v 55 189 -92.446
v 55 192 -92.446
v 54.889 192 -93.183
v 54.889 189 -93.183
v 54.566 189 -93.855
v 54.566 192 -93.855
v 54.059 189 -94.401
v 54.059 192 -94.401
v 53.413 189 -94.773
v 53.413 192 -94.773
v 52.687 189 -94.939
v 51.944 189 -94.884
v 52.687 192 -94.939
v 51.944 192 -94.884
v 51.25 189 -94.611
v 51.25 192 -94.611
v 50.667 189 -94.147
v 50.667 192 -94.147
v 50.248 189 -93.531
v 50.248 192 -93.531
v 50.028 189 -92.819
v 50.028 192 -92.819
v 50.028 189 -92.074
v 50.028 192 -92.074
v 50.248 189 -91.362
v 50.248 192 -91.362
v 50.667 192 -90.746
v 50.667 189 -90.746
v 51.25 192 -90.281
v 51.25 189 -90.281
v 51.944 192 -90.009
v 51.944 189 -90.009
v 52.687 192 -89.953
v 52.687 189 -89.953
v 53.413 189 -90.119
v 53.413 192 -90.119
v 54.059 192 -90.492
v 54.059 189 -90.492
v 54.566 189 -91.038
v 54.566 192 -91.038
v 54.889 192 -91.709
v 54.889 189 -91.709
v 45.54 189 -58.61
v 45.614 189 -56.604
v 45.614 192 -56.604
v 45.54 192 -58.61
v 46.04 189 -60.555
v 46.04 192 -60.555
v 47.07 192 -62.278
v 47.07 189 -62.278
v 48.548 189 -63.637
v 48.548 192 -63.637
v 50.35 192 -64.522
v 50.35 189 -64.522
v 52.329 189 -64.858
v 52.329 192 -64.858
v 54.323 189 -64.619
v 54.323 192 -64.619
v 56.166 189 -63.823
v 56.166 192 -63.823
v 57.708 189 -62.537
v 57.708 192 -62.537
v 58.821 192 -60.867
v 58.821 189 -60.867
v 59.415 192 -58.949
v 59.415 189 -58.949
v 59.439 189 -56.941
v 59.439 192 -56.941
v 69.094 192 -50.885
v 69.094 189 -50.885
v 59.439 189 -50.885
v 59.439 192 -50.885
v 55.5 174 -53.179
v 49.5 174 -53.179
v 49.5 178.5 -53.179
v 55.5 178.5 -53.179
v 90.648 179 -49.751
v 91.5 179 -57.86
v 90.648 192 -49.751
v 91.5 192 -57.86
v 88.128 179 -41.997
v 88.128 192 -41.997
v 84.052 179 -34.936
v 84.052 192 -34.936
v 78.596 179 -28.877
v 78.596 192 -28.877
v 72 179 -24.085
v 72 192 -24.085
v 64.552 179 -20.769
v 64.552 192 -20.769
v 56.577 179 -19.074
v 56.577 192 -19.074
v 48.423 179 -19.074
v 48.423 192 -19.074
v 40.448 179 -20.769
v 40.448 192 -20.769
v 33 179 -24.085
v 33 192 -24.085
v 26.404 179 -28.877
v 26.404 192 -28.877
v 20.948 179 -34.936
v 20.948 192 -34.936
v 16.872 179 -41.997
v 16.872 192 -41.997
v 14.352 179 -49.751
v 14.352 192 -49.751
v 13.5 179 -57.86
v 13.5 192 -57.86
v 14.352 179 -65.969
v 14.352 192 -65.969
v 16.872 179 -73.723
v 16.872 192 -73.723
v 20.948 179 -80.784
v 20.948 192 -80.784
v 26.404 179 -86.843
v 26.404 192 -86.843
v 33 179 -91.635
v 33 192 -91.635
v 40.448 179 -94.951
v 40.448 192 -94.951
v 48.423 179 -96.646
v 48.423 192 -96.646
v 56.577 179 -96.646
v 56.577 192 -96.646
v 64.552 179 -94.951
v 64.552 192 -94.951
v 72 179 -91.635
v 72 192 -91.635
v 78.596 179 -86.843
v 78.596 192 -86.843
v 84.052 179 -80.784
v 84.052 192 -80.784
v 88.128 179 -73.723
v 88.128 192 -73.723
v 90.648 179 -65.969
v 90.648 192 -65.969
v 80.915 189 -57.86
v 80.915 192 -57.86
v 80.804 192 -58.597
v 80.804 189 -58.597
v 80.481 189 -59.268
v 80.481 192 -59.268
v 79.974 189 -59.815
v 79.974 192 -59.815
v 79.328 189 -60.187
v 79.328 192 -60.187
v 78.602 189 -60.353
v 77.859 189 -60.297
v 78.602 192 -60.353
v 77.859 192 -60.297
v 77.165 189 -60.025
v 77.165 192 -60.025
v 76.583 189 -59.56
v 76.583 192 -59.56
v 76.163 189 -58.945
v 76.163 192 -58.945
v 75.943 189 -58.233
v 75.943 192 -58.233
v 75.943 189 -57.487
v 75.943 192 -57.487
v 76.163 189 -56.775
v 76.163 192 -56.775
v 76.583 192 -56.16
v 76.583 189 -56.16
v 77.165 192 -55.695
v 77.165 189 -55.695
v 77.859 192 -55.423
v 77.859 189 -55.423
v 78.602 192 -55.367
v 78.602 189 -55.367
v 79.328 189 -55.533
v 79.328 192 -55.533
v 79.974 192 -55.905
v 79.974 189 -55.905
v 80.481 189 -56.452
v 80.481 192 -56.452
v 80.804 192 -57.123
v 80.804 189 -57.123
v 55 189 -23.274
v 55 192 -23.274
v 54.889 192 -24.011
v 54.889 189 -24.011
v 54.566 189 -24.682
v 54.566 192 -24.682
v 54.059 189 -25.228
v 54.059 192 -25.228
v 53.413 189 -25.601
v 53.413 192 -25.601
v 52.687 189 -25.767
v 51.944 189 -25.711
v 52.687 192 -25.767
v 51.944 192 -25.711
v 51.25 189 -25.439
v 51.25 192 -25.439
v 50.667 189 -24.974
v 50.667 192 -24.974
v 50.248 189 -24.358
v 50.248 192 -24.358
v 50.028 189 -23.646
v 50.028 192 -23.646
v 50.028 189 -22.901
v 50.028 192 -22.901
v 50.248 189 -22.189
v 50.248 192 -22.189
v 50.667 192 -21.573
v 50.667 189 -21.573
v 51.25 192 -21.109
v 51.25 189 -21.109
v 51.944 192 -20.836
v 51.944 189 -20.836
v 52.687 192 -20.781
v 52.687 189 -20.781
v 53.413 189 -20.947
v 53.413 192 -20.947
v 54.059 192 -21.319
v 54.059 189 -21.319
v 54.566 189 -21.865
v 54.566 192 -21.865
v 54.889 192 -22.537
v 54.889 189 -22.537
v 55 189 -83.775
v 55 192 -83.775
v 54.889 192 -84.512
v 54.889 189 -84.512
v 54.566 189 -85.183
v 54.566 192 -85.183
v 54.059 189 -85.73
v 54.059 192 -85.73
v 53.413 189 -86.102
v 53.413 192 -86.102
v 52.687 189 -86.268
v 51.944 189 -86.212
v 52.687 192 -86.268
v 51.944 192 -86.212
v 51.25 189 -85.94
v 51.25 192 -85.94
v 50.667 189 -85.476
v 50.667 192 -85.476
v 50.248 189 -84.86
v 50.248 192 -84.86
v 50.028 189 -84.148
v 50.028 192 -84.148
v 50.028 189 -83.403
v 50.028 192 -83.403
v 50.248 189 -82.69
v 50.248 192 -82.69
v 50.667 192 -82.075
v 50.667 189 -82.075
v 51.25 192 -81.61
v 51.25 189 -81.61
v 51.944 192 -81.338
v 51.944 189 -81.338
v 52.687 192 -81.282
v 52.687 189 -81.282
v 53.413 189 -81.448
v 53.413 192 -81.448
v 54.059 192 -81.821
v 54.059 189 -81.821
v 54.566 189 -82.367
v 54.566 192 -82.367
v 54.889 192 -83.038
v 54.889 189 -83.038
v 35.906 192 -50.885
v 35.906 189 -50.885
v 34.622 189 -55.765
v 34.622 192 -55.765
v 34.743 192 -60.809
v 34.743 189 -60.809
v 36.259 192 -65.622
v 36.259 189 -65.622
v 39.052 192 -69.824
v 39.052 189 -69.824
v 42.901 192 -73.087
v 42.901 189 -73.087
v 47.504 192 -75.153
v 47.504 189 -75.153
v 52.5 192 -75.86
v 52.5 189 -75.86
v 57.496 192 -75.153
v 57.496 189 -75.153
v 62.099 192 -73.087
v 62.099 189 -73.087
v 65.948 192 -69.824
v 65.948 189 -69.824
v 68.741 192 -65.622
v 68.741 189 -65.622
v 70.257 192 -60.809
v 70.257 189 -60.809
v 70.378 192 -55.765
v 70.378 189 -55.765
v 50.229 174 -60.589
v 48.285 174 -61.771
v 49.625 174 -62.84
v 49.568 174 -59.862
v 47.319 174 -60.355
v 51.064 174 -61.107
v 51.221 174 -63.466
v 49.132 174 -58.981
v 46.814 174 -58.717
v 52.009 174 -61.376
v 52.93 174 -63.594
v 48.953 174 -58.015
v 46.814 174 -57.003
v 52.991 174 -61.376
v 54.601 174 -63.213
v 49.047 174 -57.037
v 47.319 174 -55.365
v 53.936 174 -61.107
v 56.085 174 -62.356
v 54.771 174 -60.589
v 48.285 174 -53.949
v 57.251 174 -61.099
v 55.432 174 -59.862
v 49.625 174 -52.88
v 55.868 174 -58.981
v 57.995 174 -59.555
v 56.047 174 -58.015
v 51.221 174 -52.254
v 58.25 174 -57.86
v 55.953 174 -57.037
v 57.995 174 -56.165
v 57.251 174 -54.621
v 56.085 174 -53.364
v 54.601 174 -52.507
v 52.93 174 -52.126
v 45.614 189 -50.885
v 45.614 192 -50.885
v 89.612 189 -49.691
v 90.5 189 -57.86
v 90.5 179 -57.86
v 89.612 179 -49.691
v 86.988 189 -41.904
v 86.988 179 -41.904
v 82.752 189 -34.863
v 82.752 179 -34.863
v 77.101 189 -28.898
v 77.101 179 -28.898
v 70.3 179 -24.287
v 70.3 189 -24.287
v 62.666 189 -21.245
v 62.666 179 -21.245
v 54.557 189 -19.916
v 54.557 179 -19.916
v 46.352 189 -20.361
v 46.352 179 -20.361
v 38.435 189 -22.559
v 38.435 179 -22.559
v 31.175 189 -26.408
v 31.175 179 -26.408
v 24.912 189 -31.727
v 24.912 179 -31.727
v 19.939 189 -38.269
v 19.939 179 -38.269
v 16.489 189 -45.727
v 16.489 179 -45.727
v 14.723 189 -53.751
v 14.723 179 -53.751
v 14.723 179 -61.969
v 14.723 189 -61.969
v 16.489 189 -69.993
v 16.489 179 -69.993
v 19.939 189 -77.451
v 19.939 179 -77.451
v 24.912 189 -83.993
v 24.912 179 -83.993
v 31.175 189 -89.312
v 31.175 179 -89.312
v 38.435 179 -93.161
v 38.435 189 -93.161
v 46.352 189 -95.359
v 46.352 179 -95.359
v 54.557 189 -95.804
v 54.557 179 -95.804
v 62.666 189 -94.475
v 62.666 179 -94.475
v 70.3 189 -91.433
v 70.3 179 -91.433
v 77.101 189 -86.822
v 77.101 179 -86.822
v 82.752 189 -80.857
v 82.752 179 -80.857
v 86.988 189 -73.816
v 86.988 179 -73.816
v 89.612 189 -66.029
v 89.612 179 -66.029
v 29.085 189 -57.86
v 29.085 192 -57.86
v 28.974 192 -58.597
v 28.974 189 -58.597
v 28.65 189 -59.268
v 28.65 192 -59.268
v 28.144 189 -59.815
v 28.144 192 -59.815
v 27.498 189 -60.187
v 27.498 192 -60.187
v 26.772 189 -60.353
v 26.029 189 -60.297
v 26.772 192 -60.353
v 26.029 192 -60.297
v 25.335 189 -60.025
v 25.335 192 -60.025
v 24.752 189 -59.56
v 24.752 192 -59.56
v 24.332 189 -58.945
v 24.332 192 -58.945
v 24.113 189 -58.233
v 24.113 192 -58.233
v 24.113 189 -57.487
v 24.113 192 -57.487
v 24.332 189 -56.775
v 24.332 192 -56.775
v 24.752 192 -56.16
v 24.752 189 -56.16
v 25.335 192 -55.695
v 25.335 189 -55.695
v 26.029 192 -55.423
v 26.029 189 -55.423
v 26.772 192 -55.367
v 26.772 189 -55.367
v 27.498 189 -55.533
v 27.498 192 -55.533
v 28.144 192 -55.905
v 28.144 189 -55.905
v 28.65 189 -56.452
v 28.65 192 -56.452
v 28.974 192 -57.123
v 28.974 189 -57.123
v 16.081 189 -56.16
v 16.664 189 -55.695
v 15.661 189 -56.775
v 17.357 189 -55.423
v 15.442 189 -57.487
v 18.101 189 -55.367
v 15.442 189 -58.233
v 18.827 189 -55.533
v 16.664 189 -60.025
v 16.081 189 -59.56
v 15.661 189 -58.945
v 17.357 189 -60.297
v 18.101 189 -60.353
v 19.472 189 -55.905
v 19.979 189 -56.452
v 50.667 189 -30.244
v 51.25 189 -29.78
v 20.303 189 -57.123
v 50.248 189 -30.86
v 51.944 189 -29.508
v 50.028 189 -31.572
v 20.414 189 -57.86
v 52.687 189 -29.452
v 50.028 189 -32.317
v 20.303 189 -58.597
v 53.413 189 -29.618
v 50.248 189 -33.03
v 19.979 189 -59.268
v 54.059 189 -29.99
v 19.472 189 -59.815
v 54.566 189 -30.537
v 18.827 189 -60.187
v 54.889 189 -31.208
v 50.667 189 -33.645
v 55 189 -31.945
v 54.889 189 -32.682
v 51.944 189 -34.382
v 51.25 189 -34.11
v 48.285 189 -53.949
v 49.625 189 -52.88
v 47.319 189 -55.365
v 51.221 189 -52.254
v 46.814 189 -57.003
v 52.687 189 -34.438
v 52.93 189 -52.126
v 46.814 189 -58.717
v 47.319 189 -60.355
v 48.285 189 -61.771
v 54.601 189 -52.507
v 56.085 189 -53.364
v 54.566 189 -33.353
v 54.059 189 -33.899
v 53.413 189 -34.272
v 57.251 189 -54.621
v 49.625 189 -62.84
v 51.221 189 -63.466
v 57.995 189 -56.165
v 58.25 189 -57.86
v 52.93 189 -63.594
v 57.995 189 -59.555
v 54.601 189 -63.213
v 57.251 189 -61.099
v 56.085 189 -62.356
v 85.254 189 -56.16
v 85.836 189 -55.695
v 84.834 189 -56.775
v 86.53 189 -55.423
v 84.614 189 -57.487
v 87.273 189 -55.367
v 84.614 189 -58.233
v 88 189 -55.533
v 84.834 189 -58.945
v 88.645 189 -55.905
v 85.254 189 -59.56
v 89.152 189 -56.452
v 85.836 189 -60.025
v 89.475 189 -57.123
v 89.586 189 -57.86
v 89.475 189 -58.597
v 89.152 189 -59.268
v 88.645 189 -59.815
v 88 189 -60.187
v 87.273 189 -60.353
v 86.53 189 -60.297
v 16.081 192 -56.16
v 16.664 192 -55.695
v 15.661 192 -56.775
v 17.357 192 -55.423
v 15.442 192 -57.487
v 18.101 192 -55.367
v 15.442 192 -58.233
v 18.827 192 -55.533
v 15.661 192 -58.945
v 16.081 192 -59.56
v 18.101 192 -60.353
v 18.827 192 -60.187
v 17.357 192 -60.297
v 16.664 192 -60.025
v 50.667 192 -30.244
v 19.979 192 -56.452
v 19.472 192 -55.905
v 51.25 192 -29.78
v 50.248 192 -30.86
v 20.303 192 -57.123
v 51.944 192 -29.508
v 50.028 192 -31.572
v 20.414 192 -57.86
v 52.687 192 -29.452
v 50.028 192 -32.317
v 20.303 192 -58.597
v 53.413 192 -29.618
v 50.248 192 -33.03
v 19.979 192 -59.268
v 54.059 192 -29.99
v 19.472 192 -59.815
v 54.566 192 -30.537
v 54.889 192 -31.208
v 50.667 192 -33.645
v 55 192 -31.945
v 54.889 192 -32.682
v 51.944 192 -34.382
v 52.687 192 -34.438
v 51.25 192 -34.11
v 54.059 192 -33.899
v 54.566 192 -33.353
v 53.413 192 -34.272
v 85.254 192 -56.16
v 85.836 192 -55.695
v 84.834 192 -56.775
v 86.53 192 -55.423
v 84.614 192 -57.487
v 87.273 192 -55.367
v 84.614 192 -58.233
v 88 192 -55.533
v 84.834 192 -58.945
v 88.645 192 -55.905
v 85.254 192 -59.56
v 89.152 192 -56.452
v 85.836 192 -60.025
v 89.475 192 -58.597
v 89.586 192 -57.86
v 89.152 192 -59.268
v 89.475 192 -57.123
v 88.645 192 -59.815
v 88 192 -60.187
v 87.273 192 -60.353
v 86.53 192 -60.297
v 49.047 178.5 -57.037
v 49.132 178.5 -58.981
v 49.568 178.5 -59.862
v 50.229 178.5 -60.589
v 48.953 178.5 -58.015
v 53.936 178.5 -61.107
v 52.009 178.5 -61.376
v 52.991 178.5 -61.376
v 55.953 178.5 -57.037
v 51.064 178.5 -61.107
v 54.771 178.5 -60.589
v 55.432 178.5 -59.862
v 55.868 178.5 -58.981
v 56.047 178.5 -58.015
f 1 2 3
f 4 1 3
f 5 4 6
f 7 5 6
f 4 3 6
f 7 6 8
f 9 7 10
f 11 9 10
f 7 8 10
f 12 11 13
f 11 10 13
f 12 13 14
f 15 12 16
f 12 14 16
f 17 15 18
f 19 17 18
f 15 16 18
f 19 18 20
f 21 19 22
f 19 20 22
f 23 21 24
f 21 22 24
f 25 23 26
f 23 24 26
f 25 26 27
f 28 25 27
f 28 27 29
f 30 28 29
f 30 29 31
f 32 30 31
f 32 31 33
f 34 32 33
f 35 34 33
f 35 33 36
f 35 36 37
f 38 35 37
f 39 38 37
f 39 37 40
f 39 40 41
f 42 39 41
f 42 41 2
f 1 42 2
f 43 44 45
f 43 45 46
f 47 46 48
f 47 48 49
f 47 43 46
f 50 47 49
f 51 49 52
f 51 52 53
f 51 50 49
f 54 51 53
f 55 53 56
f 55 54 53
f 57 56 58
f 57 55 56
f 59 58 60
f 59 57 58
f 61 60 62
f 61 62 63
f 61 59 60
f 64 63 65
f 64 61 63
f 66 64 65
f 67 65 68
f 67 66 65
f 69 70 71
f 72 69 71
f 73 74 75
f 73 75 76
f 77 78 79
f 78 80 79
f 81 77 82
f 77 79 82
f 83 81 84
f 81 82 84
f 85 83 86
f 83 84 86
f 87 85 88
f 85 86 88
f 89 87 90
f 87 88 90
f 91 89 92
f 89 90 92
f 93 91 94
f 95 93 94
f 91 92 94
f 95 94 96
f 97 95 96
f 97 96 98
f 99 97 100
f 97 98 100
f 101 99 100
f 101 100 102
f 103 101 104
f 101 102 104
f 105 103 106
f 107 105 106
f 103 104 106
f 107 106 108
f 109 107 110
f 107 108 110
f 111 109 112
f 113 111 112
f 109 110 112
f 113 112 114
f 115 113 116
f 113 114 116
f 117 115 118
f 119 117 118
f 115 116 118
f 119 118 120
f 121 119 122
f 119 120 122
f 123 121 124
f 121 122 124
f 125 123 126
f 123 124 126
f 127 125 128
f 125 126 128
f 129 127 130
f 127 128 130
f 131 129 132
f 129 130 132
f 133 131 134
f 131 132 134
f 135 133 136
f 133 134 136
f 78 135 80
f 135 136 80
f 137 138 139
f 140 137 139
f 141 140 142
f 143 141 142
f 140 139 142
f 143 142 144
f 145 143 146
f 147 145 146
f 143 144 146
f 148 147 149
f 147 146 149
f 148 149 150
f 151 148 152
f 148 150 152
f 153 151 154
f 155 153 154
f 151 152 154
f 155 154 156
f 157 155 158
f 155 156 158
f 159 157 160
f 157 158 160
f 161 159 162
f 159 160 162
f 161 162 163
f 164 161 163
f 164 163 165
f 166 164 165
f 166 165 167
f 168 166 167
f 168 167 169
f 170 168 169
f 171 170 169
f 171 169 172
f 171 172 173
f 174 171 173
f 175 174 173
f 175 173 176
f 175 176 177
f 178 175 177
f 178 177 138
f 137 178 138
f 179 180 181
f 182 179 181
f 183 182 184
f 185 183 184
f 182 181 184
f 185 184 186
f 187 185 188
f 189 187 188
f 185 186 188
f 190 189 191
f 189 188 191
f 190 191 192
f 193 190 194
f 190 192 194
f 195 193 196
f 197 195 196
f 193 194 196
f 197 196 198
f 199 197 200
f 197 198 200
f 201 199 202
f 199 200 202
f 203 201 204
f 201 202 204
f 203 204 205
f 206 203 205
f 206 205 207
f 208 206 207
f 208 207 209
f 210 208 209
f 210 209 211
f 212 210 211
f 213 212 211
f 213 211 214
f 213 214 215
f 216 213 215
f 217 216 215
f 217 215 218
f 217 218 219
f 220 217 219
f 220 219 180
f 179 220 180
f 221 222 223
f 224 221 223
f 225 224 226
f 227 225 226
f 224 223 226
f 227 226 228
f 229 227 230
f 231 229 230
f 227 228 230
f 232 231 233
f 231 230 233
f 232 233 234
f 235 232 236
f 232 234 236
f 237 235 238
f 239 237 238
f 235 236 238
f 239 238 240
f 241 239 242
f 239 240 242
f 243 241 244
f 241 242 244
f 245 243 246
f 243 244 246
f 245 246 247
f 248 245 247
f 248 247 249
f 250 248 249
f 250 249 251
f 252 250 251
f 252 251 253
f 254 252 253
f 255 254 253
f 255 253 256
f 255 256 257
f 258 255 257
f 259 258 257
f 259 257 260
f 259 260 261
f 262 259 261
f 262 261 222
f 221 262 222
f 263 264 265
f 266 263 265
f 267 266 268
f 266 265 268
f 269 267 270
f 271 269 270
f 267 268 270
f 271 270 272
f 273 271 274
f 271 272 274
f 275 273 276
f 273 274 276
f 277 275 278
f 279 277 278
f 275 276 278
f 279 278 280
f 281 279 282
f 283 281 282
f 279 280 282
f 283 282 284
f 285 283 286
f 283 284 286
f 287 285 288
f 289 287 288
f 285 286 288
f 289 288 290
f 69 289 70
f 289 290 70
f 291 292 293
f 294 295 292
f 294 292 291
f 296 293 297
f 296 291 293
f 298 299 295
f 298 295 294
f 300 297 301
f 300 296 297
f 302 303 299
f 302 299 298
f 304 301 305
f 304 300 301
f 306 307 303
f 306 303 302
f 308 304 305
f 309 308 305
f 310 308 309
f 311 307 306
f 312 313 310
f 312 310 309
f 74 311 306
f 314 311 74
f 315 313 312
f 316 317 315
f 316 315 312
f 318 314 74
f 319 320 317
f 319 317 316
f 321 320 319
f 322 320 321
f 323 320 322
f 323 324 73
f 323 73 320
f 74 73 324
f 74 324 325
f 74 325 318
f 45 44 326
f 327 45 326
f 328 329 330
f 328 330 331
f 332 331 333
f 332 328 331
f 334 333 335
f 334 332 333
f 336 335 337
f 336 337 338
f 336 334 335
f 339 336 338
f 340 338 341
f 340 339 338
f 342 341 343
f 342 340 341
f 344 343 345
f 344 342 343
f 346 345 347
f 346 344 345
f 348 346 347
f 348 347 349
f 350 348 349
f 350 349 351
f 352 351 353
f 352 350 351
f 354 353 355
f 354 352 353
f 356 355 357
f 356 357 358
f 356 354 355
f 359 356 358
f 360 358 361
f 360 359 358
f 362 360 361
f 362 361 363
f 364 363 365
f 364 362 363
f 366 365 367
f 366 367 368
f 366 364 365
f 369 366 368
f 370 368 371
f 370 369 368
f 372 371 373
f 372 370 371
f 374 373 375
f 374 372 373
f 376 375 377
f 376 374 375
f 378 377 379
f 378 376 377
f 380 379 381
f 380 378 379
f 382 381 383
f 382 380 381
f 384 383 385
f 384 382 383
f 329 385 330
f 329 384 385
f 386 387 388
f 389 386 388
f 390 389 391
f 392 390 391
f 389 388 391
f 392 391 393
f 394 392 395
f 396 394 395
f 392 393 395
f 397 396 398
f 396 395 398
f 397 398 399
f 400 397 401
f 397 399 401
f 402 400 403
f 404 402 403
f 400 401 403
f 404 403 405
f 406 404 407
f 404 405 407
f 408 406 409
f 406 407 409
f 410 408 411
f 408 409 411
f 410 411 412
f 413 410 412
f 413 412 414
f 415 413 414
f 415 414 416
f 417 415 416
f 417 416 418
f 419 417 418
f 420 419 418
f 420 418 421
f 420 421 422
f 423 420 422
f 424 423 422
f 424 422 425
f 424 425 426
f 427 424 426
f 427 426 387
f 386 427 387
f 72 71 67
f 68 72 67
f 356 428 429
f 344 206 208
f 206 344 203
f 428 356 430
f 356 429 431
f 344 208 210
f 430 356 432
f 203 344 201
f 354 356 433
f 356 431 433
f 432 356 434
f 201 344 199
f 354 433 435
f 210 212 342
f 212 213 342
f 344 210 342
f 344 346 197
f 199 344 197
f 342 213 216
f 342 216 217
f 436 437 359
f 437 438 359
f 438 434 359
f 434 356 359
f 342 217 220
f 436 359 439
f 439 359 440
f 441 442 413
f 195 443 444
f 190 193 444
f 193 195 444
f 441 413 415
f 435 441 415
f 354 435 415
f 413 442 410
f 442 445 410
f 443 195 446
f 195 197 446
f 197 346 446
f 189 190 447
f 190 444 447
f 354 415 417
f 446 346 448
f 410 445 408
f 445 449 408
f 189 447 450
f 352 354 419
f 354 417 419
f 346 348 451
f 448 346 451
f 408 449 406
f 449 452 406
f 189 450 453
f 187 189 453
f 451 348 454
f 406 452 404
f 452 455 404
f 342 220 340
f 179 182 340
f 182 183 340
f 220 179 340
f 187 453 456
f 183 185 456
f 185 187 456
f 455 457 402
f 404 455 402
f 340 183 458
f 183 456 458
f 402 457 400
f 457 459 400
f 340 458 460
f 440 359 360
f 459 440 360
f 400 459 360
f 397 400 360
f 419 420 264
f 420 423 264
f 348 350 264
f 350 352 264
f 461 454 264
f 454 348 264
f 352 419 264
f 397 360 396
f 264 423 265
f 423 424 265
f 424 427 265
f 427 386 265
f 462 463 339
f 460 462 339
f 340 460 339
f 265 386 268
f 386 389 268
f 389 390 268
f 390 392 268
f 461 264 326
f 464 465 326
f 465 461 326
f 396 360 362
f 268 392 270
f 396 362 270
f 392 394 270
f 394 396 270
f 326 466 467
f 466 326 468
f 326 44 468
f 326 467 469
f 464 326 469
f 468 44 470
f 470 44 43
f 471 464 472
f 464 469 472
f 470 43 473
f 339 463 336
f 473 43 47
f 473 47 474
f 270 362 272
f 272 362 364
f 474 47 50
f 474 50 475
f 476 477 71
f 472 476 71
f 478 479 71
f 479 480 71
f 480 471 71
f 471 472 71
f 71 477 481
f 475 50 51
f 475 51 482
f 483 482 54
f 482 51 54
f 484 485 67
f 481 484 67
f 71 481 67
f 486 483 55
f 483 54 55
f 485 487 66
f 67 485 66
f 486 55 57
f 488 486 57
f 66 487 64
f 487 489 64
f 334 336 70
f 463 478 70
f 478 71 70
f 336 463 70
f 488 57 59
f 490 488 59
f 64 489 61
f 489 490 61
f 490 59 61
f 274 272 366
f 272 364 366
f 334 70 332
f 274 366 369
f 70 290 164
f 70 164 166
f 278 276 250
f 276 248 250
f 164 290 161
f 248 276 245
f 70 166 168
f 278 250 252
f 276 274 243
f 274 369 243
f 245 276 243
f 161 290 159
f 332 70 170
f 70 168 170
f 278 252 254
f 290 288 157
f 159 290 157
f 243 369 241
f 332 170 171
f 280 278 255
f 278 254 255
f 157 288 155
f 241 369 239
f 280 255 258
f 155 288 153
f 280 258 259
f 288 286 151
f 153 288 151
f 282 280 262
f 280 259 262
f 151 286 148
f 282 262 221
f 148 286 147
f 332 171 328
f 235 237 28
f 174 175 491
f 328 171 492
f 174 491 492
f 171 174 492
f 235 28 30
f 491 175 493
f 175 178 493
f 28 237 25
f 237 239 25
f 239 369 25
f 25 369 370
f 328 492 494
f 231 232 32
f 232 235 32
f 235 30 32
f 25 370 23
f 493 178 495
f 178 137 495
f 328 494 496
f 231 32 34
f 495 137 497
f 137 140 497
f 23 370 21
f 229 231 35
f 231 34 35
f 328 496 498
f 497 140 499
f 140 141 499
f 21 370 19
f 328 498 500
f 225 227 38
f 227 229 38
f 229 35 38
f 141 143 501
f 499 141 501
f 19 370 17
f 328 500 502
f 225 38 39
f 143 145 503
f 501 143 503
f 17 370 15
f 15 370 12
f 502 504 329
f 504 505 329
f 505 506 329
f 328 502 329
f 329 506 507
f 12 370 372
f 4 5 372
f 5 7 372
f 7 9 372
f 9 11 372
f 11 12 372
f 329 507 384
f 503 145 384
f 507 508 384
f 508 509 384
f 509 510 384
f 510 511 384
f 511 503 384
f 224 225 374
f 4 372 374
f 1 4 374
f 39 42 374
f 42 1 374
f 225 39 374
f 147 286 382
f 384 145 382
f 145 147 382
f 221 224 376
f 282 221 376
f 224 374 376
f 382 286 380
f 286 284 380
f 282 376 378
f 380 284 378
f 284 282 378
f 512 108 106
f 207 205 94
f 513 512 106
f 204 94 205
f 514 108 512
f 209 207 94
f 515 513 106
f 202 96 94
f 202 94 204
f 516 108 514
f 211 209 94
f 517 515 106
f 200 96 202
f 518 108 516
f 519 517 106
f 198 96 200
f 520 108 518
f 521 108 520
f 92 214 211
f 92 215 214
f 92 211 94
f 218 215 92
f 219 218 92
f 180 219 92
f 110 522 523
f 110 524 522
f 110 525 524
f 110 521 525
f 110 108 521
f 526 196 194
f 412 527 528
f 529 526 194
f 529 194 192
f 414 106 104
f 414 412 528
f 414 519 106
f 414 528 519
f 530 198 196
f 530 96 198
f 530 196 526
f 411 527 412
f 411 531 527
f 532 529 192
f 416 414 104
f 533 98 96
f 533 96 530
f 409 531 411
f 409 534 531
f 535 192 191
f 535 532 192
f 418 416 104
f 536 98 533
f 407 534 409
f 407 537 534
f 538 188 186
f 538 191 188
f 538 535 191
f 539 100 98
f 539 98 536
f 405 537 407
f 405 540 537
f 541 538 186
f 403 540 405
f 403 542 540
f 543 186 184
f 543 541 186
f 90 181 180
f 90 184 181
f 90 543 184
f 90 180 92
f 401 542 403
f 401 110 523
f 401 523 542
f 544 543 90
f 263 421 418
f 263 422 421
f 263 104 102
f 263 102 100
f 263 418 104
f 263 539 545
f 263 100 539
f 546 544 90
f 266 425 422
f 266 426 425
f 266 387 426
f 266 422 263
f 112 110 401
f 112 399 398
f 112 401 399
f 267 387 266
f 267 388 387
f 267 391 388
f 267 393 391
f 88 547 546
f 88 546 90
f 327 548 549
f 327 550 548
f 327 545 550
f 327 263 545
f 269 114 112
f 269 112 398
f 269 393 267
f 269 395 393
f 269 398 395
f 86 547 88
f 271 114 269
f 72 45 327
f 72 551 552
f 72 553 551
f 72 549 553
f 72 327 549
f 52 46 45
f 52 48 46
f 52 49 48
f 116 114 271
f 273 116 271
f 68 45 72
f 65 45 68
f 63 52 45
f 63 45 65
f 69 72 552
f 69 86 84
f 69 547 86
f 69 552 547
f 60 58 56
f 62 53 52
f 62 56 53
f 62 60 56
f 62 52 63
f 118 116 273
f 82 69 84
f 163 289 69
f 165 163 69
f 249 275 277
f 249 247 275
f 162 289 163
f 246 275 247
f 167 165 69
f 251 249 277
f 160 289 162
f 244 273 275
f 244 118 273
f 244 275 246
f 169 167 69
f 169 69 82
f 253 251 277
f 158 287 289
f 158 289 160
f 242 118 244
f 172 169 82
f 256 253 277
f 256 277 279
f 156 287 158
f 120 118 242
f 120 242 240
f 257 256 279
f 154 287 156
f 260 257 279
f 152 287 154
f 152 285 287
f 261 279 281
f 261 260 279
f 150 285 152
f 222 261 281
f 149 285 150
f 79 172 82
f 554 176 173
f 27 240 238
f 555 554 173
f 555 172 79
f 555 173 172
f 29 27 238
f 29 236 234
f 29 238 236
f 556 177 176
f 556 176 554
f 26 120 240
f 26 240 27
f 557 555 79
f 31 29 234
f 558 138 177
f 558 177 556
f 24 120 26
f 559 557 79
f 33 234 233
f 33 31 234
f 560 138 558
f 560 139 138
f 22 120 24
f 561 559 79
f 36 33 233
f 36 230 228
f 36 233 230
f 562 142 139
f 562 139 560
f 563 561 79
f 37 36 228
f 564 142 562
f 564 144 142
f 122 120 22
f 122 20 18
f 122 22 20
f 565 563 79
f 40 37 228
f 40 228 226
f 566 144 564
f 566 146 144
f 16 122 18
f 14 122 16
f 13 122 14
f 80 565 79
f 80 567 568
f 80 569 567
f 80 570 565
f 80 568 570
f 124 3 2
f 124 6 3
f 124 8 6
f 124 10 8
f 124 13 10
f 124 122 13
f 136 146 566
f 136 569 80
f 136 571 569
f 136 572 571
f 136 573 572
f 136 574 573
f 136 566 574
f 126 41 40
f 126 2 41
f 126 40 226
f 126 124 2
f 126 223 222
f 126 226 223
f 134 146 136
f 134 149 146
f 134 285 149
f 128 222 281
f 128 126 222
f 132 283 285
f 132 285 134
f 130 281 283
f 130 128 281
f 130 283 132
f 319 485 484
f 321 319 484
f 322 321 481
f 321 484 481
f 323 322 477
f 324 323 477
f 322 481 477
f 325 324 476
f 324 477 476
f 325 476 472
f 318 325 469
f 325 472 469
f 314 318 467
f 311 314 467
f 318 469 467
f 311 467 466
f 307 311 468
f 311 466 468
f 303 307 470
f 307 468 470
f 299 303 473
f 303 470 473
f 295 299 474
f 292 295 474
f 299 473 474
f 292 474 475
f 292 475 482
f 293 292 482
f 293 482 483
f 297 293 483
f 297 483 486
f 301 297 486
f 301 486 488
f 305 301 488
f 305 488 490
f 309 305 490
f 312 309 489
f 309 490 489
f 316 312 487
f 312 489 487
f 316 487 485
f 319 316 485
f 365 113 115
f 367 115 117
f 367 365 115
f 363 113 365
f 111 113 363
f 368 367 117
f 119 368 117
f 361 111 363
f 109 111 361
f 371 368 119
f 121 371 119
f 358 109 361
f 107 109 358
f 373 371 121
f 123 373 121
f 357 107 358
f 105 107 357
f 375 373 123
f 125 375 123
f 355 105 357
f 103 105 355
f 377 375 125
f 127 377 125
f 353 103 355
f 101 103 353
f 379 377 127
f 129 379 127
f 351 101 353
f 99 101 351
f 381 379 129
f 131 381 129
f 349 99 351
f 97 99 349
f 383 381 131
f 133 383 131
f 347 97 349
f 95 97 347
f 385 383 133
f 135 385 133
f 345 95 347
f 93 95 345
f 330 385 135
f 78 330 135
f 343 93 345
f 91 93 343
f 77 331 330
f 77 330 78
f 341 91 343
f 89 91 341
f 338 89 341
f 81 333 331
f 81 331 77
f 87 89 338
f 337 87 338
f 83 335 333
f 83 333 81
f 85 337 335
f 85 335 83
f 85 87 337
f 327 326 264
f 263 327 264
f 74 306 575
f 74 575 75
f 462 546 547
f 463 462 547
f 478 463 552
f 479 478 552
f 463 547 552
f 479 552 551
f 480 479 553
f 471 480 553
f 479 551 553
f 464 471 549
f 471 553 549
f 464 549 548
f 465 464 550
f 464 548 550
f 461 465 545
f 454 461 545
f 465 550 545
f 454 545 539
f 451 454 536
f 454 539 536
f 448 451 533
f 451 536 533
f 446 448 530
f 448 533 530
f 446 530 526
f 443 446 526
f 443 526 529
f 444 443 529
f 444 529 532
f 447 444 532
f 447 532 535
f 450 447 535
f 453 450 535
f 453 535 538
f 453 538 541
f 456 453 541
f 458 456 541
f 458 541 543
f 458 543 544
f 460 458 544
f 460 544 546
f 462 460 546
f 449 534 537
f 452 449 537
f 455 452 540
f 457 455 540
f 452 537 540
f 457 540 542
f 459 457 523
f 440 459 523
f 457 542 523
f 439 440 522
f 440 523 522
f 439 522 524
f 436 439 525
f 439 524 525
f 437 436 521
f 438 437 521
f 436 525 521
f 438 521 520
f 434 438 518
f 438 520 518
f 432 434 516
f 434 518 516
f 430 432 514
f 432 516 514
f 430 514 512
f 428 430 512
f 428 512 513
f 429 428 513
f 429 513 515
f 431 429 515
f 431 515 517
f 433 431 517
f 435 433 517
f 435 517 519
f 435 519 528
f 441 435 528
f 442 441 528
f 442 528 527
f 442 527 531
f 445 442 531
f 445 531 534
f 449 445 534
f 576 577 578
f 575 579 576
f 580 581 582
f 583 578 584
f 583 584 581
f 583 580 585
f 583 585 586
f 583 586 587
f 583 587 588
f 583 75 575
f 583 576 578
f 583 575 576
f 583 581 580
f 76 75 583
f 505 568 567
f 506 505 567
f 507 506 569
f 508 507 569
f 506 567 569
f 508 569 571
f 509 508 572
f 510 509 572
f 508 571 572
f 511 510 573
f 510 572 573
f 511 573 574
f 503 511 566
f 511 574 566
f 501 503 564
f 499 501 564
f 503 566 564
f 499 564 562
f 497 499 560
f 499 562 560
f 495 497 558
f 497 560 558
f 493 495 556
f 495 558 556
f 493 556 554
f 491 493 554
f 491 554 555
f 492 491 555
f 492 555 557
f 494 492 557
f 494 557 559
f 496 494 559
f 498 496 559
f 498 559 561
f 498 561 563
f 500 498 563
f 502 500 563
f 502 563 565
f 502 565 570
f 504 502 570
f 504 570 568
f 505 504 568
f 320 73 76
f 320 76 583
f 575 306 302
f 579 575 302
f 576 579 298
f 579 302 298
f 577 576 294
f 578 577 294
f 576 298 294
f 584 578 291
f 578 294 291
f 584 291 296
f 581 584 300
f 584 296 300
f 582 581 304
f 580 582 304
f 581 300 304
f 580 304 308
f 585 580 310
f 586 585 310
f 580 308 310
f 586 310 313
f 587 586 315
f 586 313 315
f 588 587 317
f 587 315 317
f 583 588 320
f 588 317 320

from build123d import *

# Parameters (mm, degrees)
SKETCH086_R     = 5.75
PAD036_DEPTH    = 15
SKETCH087_R     = 39
PAD037_DEPTH    = 3
SKETCH090_R     = 39
SKETCH090_R_2   = 38
PAD040_DEPTH    = 10
POCKET042_DEPTH = 5
SKETCH092_R     = 2.5
POCKET043_DEPTH = 5
POCKET044_DEPTH = 4.5


with BuildPart() as part:
    # Sketch086 → Pad036 (new body)
    with BuildSketch(Plane.XZ):
        with Locations((52.5, -57.86)):
            Circle(SKETCH086_R)
    extrude(amount=PAD036_DEPTH)

    # Sketch087 (on Face2 of Pad036) → Pad037 (join)
    with BuildSketch(Plane(origin=(0, 0, 0), x_dir=(1, 0, 0), z_dir=(0, 1, 0))):
        with Locations((52.5, 57.86)):
            Circle(SKETCH087_R)
    extrude(amount=PAD037_DEPTH)

    # Sketch090 → Pad040 (join)
    with BuildSketch(Plane.XZ):
        with Locations((52.5, -57.86)):
            Circle(SKETCH090_R)
        with Locations((52.5, -57.86)):
            Circle(SKETCH090_R_2, mode=Mode.SUBTRACT)
    extrude(amount=PAD040_DEPTH)

    # Sketch091 (on Face6 of Pad040) → Pocket042 (cut)
    with BuildSketch(Plane.XZ):
        with BuildLine():
            ThreePointArc((35.9062672696, -50.8851857321), (52.5, -75.86), (69.0937327304, -50.8851857321))
            Line((69.0937327304, -50.8851857321), (59.439457, -50.8851857321))
            Line((59.439457, -50.8851857321), (59.439457, -56.9413398097))
            ThreePointArc((45.6135845341, -56.6041011066), (52.3293077717, -64.8579185593), (59.439457, -56.9413398097))
            Line((45.6135845341, -56.6041011066), (45.6135845341, -50.8851857321))
            Line((45.6135845341, -50.8851857321), (35.9062672696, -50.8851857321))
        make_face()
    extrude(amount=-POCKET042_DEPTH, mode=Mode.SUBTRACT)

    # Sketch092 (on Face3 of Pocket042) → Pocket043 (cut)
    with BuildSketch(Plane(origin=(0, 3, 0), x_dir=(1, 0, 0), z_dir=(0, 1, 0))):
        with Locations((17.9137178727, 57.86)):
            Circle(SKETCH092_R)
        with Locations((26.5848547865, 57.86)):
            Circle(SKETCH092_R)
        with Locations((52.5, 92.4462821273)):
            Circle(SKETCH092_R)
        with Locations((52.5, 83.7751452135)):
            Circle(SKETCH092_R)
        with Locations((78.4151452135, 57.86)):
            Circle(SKETCH092_R)
        with Locations((87.0862821273, 57.86)):
            Circle(SKETCH092_R)
        with Locations((52.5, 31.9448547865)):
            Circle(SKETCH092_R)
        with Locations((52.5, 23.2737178727)):
            Circle(SKETCH092_R)
    extrude(amount=-POCKET043_DEPTH, mode=Mode.SUBTRACT)

    # Sketch093 (on Face22 of Pocket043) → Pocket044 (cut)
    with BuildSketch(Plane.XZ.offset(15)):
        with BuildLine():
            ThreePointArc((49.0466730198, -57.0371799905), (52.5000100371, -61.41), (55.9533223273, -57.037160463))
            Line((55.5, -53.178869006), (55.9533223273, -57.037160463))
            Line((49.5, -53.178869006), (55.5, -53.178869006))
            Line((49.0466730198, -57.0371799905), (49.5, -53.178869006))
        make_face()
    extrude(amount=-POCKET044_DEPTH, mode=Mode.SUBTRACT)


with BuildPart() as part_1:
    # Body011 placement: moved
    add(part.part.moved(Location((0, 189, 0))))


solid = part_1.part
